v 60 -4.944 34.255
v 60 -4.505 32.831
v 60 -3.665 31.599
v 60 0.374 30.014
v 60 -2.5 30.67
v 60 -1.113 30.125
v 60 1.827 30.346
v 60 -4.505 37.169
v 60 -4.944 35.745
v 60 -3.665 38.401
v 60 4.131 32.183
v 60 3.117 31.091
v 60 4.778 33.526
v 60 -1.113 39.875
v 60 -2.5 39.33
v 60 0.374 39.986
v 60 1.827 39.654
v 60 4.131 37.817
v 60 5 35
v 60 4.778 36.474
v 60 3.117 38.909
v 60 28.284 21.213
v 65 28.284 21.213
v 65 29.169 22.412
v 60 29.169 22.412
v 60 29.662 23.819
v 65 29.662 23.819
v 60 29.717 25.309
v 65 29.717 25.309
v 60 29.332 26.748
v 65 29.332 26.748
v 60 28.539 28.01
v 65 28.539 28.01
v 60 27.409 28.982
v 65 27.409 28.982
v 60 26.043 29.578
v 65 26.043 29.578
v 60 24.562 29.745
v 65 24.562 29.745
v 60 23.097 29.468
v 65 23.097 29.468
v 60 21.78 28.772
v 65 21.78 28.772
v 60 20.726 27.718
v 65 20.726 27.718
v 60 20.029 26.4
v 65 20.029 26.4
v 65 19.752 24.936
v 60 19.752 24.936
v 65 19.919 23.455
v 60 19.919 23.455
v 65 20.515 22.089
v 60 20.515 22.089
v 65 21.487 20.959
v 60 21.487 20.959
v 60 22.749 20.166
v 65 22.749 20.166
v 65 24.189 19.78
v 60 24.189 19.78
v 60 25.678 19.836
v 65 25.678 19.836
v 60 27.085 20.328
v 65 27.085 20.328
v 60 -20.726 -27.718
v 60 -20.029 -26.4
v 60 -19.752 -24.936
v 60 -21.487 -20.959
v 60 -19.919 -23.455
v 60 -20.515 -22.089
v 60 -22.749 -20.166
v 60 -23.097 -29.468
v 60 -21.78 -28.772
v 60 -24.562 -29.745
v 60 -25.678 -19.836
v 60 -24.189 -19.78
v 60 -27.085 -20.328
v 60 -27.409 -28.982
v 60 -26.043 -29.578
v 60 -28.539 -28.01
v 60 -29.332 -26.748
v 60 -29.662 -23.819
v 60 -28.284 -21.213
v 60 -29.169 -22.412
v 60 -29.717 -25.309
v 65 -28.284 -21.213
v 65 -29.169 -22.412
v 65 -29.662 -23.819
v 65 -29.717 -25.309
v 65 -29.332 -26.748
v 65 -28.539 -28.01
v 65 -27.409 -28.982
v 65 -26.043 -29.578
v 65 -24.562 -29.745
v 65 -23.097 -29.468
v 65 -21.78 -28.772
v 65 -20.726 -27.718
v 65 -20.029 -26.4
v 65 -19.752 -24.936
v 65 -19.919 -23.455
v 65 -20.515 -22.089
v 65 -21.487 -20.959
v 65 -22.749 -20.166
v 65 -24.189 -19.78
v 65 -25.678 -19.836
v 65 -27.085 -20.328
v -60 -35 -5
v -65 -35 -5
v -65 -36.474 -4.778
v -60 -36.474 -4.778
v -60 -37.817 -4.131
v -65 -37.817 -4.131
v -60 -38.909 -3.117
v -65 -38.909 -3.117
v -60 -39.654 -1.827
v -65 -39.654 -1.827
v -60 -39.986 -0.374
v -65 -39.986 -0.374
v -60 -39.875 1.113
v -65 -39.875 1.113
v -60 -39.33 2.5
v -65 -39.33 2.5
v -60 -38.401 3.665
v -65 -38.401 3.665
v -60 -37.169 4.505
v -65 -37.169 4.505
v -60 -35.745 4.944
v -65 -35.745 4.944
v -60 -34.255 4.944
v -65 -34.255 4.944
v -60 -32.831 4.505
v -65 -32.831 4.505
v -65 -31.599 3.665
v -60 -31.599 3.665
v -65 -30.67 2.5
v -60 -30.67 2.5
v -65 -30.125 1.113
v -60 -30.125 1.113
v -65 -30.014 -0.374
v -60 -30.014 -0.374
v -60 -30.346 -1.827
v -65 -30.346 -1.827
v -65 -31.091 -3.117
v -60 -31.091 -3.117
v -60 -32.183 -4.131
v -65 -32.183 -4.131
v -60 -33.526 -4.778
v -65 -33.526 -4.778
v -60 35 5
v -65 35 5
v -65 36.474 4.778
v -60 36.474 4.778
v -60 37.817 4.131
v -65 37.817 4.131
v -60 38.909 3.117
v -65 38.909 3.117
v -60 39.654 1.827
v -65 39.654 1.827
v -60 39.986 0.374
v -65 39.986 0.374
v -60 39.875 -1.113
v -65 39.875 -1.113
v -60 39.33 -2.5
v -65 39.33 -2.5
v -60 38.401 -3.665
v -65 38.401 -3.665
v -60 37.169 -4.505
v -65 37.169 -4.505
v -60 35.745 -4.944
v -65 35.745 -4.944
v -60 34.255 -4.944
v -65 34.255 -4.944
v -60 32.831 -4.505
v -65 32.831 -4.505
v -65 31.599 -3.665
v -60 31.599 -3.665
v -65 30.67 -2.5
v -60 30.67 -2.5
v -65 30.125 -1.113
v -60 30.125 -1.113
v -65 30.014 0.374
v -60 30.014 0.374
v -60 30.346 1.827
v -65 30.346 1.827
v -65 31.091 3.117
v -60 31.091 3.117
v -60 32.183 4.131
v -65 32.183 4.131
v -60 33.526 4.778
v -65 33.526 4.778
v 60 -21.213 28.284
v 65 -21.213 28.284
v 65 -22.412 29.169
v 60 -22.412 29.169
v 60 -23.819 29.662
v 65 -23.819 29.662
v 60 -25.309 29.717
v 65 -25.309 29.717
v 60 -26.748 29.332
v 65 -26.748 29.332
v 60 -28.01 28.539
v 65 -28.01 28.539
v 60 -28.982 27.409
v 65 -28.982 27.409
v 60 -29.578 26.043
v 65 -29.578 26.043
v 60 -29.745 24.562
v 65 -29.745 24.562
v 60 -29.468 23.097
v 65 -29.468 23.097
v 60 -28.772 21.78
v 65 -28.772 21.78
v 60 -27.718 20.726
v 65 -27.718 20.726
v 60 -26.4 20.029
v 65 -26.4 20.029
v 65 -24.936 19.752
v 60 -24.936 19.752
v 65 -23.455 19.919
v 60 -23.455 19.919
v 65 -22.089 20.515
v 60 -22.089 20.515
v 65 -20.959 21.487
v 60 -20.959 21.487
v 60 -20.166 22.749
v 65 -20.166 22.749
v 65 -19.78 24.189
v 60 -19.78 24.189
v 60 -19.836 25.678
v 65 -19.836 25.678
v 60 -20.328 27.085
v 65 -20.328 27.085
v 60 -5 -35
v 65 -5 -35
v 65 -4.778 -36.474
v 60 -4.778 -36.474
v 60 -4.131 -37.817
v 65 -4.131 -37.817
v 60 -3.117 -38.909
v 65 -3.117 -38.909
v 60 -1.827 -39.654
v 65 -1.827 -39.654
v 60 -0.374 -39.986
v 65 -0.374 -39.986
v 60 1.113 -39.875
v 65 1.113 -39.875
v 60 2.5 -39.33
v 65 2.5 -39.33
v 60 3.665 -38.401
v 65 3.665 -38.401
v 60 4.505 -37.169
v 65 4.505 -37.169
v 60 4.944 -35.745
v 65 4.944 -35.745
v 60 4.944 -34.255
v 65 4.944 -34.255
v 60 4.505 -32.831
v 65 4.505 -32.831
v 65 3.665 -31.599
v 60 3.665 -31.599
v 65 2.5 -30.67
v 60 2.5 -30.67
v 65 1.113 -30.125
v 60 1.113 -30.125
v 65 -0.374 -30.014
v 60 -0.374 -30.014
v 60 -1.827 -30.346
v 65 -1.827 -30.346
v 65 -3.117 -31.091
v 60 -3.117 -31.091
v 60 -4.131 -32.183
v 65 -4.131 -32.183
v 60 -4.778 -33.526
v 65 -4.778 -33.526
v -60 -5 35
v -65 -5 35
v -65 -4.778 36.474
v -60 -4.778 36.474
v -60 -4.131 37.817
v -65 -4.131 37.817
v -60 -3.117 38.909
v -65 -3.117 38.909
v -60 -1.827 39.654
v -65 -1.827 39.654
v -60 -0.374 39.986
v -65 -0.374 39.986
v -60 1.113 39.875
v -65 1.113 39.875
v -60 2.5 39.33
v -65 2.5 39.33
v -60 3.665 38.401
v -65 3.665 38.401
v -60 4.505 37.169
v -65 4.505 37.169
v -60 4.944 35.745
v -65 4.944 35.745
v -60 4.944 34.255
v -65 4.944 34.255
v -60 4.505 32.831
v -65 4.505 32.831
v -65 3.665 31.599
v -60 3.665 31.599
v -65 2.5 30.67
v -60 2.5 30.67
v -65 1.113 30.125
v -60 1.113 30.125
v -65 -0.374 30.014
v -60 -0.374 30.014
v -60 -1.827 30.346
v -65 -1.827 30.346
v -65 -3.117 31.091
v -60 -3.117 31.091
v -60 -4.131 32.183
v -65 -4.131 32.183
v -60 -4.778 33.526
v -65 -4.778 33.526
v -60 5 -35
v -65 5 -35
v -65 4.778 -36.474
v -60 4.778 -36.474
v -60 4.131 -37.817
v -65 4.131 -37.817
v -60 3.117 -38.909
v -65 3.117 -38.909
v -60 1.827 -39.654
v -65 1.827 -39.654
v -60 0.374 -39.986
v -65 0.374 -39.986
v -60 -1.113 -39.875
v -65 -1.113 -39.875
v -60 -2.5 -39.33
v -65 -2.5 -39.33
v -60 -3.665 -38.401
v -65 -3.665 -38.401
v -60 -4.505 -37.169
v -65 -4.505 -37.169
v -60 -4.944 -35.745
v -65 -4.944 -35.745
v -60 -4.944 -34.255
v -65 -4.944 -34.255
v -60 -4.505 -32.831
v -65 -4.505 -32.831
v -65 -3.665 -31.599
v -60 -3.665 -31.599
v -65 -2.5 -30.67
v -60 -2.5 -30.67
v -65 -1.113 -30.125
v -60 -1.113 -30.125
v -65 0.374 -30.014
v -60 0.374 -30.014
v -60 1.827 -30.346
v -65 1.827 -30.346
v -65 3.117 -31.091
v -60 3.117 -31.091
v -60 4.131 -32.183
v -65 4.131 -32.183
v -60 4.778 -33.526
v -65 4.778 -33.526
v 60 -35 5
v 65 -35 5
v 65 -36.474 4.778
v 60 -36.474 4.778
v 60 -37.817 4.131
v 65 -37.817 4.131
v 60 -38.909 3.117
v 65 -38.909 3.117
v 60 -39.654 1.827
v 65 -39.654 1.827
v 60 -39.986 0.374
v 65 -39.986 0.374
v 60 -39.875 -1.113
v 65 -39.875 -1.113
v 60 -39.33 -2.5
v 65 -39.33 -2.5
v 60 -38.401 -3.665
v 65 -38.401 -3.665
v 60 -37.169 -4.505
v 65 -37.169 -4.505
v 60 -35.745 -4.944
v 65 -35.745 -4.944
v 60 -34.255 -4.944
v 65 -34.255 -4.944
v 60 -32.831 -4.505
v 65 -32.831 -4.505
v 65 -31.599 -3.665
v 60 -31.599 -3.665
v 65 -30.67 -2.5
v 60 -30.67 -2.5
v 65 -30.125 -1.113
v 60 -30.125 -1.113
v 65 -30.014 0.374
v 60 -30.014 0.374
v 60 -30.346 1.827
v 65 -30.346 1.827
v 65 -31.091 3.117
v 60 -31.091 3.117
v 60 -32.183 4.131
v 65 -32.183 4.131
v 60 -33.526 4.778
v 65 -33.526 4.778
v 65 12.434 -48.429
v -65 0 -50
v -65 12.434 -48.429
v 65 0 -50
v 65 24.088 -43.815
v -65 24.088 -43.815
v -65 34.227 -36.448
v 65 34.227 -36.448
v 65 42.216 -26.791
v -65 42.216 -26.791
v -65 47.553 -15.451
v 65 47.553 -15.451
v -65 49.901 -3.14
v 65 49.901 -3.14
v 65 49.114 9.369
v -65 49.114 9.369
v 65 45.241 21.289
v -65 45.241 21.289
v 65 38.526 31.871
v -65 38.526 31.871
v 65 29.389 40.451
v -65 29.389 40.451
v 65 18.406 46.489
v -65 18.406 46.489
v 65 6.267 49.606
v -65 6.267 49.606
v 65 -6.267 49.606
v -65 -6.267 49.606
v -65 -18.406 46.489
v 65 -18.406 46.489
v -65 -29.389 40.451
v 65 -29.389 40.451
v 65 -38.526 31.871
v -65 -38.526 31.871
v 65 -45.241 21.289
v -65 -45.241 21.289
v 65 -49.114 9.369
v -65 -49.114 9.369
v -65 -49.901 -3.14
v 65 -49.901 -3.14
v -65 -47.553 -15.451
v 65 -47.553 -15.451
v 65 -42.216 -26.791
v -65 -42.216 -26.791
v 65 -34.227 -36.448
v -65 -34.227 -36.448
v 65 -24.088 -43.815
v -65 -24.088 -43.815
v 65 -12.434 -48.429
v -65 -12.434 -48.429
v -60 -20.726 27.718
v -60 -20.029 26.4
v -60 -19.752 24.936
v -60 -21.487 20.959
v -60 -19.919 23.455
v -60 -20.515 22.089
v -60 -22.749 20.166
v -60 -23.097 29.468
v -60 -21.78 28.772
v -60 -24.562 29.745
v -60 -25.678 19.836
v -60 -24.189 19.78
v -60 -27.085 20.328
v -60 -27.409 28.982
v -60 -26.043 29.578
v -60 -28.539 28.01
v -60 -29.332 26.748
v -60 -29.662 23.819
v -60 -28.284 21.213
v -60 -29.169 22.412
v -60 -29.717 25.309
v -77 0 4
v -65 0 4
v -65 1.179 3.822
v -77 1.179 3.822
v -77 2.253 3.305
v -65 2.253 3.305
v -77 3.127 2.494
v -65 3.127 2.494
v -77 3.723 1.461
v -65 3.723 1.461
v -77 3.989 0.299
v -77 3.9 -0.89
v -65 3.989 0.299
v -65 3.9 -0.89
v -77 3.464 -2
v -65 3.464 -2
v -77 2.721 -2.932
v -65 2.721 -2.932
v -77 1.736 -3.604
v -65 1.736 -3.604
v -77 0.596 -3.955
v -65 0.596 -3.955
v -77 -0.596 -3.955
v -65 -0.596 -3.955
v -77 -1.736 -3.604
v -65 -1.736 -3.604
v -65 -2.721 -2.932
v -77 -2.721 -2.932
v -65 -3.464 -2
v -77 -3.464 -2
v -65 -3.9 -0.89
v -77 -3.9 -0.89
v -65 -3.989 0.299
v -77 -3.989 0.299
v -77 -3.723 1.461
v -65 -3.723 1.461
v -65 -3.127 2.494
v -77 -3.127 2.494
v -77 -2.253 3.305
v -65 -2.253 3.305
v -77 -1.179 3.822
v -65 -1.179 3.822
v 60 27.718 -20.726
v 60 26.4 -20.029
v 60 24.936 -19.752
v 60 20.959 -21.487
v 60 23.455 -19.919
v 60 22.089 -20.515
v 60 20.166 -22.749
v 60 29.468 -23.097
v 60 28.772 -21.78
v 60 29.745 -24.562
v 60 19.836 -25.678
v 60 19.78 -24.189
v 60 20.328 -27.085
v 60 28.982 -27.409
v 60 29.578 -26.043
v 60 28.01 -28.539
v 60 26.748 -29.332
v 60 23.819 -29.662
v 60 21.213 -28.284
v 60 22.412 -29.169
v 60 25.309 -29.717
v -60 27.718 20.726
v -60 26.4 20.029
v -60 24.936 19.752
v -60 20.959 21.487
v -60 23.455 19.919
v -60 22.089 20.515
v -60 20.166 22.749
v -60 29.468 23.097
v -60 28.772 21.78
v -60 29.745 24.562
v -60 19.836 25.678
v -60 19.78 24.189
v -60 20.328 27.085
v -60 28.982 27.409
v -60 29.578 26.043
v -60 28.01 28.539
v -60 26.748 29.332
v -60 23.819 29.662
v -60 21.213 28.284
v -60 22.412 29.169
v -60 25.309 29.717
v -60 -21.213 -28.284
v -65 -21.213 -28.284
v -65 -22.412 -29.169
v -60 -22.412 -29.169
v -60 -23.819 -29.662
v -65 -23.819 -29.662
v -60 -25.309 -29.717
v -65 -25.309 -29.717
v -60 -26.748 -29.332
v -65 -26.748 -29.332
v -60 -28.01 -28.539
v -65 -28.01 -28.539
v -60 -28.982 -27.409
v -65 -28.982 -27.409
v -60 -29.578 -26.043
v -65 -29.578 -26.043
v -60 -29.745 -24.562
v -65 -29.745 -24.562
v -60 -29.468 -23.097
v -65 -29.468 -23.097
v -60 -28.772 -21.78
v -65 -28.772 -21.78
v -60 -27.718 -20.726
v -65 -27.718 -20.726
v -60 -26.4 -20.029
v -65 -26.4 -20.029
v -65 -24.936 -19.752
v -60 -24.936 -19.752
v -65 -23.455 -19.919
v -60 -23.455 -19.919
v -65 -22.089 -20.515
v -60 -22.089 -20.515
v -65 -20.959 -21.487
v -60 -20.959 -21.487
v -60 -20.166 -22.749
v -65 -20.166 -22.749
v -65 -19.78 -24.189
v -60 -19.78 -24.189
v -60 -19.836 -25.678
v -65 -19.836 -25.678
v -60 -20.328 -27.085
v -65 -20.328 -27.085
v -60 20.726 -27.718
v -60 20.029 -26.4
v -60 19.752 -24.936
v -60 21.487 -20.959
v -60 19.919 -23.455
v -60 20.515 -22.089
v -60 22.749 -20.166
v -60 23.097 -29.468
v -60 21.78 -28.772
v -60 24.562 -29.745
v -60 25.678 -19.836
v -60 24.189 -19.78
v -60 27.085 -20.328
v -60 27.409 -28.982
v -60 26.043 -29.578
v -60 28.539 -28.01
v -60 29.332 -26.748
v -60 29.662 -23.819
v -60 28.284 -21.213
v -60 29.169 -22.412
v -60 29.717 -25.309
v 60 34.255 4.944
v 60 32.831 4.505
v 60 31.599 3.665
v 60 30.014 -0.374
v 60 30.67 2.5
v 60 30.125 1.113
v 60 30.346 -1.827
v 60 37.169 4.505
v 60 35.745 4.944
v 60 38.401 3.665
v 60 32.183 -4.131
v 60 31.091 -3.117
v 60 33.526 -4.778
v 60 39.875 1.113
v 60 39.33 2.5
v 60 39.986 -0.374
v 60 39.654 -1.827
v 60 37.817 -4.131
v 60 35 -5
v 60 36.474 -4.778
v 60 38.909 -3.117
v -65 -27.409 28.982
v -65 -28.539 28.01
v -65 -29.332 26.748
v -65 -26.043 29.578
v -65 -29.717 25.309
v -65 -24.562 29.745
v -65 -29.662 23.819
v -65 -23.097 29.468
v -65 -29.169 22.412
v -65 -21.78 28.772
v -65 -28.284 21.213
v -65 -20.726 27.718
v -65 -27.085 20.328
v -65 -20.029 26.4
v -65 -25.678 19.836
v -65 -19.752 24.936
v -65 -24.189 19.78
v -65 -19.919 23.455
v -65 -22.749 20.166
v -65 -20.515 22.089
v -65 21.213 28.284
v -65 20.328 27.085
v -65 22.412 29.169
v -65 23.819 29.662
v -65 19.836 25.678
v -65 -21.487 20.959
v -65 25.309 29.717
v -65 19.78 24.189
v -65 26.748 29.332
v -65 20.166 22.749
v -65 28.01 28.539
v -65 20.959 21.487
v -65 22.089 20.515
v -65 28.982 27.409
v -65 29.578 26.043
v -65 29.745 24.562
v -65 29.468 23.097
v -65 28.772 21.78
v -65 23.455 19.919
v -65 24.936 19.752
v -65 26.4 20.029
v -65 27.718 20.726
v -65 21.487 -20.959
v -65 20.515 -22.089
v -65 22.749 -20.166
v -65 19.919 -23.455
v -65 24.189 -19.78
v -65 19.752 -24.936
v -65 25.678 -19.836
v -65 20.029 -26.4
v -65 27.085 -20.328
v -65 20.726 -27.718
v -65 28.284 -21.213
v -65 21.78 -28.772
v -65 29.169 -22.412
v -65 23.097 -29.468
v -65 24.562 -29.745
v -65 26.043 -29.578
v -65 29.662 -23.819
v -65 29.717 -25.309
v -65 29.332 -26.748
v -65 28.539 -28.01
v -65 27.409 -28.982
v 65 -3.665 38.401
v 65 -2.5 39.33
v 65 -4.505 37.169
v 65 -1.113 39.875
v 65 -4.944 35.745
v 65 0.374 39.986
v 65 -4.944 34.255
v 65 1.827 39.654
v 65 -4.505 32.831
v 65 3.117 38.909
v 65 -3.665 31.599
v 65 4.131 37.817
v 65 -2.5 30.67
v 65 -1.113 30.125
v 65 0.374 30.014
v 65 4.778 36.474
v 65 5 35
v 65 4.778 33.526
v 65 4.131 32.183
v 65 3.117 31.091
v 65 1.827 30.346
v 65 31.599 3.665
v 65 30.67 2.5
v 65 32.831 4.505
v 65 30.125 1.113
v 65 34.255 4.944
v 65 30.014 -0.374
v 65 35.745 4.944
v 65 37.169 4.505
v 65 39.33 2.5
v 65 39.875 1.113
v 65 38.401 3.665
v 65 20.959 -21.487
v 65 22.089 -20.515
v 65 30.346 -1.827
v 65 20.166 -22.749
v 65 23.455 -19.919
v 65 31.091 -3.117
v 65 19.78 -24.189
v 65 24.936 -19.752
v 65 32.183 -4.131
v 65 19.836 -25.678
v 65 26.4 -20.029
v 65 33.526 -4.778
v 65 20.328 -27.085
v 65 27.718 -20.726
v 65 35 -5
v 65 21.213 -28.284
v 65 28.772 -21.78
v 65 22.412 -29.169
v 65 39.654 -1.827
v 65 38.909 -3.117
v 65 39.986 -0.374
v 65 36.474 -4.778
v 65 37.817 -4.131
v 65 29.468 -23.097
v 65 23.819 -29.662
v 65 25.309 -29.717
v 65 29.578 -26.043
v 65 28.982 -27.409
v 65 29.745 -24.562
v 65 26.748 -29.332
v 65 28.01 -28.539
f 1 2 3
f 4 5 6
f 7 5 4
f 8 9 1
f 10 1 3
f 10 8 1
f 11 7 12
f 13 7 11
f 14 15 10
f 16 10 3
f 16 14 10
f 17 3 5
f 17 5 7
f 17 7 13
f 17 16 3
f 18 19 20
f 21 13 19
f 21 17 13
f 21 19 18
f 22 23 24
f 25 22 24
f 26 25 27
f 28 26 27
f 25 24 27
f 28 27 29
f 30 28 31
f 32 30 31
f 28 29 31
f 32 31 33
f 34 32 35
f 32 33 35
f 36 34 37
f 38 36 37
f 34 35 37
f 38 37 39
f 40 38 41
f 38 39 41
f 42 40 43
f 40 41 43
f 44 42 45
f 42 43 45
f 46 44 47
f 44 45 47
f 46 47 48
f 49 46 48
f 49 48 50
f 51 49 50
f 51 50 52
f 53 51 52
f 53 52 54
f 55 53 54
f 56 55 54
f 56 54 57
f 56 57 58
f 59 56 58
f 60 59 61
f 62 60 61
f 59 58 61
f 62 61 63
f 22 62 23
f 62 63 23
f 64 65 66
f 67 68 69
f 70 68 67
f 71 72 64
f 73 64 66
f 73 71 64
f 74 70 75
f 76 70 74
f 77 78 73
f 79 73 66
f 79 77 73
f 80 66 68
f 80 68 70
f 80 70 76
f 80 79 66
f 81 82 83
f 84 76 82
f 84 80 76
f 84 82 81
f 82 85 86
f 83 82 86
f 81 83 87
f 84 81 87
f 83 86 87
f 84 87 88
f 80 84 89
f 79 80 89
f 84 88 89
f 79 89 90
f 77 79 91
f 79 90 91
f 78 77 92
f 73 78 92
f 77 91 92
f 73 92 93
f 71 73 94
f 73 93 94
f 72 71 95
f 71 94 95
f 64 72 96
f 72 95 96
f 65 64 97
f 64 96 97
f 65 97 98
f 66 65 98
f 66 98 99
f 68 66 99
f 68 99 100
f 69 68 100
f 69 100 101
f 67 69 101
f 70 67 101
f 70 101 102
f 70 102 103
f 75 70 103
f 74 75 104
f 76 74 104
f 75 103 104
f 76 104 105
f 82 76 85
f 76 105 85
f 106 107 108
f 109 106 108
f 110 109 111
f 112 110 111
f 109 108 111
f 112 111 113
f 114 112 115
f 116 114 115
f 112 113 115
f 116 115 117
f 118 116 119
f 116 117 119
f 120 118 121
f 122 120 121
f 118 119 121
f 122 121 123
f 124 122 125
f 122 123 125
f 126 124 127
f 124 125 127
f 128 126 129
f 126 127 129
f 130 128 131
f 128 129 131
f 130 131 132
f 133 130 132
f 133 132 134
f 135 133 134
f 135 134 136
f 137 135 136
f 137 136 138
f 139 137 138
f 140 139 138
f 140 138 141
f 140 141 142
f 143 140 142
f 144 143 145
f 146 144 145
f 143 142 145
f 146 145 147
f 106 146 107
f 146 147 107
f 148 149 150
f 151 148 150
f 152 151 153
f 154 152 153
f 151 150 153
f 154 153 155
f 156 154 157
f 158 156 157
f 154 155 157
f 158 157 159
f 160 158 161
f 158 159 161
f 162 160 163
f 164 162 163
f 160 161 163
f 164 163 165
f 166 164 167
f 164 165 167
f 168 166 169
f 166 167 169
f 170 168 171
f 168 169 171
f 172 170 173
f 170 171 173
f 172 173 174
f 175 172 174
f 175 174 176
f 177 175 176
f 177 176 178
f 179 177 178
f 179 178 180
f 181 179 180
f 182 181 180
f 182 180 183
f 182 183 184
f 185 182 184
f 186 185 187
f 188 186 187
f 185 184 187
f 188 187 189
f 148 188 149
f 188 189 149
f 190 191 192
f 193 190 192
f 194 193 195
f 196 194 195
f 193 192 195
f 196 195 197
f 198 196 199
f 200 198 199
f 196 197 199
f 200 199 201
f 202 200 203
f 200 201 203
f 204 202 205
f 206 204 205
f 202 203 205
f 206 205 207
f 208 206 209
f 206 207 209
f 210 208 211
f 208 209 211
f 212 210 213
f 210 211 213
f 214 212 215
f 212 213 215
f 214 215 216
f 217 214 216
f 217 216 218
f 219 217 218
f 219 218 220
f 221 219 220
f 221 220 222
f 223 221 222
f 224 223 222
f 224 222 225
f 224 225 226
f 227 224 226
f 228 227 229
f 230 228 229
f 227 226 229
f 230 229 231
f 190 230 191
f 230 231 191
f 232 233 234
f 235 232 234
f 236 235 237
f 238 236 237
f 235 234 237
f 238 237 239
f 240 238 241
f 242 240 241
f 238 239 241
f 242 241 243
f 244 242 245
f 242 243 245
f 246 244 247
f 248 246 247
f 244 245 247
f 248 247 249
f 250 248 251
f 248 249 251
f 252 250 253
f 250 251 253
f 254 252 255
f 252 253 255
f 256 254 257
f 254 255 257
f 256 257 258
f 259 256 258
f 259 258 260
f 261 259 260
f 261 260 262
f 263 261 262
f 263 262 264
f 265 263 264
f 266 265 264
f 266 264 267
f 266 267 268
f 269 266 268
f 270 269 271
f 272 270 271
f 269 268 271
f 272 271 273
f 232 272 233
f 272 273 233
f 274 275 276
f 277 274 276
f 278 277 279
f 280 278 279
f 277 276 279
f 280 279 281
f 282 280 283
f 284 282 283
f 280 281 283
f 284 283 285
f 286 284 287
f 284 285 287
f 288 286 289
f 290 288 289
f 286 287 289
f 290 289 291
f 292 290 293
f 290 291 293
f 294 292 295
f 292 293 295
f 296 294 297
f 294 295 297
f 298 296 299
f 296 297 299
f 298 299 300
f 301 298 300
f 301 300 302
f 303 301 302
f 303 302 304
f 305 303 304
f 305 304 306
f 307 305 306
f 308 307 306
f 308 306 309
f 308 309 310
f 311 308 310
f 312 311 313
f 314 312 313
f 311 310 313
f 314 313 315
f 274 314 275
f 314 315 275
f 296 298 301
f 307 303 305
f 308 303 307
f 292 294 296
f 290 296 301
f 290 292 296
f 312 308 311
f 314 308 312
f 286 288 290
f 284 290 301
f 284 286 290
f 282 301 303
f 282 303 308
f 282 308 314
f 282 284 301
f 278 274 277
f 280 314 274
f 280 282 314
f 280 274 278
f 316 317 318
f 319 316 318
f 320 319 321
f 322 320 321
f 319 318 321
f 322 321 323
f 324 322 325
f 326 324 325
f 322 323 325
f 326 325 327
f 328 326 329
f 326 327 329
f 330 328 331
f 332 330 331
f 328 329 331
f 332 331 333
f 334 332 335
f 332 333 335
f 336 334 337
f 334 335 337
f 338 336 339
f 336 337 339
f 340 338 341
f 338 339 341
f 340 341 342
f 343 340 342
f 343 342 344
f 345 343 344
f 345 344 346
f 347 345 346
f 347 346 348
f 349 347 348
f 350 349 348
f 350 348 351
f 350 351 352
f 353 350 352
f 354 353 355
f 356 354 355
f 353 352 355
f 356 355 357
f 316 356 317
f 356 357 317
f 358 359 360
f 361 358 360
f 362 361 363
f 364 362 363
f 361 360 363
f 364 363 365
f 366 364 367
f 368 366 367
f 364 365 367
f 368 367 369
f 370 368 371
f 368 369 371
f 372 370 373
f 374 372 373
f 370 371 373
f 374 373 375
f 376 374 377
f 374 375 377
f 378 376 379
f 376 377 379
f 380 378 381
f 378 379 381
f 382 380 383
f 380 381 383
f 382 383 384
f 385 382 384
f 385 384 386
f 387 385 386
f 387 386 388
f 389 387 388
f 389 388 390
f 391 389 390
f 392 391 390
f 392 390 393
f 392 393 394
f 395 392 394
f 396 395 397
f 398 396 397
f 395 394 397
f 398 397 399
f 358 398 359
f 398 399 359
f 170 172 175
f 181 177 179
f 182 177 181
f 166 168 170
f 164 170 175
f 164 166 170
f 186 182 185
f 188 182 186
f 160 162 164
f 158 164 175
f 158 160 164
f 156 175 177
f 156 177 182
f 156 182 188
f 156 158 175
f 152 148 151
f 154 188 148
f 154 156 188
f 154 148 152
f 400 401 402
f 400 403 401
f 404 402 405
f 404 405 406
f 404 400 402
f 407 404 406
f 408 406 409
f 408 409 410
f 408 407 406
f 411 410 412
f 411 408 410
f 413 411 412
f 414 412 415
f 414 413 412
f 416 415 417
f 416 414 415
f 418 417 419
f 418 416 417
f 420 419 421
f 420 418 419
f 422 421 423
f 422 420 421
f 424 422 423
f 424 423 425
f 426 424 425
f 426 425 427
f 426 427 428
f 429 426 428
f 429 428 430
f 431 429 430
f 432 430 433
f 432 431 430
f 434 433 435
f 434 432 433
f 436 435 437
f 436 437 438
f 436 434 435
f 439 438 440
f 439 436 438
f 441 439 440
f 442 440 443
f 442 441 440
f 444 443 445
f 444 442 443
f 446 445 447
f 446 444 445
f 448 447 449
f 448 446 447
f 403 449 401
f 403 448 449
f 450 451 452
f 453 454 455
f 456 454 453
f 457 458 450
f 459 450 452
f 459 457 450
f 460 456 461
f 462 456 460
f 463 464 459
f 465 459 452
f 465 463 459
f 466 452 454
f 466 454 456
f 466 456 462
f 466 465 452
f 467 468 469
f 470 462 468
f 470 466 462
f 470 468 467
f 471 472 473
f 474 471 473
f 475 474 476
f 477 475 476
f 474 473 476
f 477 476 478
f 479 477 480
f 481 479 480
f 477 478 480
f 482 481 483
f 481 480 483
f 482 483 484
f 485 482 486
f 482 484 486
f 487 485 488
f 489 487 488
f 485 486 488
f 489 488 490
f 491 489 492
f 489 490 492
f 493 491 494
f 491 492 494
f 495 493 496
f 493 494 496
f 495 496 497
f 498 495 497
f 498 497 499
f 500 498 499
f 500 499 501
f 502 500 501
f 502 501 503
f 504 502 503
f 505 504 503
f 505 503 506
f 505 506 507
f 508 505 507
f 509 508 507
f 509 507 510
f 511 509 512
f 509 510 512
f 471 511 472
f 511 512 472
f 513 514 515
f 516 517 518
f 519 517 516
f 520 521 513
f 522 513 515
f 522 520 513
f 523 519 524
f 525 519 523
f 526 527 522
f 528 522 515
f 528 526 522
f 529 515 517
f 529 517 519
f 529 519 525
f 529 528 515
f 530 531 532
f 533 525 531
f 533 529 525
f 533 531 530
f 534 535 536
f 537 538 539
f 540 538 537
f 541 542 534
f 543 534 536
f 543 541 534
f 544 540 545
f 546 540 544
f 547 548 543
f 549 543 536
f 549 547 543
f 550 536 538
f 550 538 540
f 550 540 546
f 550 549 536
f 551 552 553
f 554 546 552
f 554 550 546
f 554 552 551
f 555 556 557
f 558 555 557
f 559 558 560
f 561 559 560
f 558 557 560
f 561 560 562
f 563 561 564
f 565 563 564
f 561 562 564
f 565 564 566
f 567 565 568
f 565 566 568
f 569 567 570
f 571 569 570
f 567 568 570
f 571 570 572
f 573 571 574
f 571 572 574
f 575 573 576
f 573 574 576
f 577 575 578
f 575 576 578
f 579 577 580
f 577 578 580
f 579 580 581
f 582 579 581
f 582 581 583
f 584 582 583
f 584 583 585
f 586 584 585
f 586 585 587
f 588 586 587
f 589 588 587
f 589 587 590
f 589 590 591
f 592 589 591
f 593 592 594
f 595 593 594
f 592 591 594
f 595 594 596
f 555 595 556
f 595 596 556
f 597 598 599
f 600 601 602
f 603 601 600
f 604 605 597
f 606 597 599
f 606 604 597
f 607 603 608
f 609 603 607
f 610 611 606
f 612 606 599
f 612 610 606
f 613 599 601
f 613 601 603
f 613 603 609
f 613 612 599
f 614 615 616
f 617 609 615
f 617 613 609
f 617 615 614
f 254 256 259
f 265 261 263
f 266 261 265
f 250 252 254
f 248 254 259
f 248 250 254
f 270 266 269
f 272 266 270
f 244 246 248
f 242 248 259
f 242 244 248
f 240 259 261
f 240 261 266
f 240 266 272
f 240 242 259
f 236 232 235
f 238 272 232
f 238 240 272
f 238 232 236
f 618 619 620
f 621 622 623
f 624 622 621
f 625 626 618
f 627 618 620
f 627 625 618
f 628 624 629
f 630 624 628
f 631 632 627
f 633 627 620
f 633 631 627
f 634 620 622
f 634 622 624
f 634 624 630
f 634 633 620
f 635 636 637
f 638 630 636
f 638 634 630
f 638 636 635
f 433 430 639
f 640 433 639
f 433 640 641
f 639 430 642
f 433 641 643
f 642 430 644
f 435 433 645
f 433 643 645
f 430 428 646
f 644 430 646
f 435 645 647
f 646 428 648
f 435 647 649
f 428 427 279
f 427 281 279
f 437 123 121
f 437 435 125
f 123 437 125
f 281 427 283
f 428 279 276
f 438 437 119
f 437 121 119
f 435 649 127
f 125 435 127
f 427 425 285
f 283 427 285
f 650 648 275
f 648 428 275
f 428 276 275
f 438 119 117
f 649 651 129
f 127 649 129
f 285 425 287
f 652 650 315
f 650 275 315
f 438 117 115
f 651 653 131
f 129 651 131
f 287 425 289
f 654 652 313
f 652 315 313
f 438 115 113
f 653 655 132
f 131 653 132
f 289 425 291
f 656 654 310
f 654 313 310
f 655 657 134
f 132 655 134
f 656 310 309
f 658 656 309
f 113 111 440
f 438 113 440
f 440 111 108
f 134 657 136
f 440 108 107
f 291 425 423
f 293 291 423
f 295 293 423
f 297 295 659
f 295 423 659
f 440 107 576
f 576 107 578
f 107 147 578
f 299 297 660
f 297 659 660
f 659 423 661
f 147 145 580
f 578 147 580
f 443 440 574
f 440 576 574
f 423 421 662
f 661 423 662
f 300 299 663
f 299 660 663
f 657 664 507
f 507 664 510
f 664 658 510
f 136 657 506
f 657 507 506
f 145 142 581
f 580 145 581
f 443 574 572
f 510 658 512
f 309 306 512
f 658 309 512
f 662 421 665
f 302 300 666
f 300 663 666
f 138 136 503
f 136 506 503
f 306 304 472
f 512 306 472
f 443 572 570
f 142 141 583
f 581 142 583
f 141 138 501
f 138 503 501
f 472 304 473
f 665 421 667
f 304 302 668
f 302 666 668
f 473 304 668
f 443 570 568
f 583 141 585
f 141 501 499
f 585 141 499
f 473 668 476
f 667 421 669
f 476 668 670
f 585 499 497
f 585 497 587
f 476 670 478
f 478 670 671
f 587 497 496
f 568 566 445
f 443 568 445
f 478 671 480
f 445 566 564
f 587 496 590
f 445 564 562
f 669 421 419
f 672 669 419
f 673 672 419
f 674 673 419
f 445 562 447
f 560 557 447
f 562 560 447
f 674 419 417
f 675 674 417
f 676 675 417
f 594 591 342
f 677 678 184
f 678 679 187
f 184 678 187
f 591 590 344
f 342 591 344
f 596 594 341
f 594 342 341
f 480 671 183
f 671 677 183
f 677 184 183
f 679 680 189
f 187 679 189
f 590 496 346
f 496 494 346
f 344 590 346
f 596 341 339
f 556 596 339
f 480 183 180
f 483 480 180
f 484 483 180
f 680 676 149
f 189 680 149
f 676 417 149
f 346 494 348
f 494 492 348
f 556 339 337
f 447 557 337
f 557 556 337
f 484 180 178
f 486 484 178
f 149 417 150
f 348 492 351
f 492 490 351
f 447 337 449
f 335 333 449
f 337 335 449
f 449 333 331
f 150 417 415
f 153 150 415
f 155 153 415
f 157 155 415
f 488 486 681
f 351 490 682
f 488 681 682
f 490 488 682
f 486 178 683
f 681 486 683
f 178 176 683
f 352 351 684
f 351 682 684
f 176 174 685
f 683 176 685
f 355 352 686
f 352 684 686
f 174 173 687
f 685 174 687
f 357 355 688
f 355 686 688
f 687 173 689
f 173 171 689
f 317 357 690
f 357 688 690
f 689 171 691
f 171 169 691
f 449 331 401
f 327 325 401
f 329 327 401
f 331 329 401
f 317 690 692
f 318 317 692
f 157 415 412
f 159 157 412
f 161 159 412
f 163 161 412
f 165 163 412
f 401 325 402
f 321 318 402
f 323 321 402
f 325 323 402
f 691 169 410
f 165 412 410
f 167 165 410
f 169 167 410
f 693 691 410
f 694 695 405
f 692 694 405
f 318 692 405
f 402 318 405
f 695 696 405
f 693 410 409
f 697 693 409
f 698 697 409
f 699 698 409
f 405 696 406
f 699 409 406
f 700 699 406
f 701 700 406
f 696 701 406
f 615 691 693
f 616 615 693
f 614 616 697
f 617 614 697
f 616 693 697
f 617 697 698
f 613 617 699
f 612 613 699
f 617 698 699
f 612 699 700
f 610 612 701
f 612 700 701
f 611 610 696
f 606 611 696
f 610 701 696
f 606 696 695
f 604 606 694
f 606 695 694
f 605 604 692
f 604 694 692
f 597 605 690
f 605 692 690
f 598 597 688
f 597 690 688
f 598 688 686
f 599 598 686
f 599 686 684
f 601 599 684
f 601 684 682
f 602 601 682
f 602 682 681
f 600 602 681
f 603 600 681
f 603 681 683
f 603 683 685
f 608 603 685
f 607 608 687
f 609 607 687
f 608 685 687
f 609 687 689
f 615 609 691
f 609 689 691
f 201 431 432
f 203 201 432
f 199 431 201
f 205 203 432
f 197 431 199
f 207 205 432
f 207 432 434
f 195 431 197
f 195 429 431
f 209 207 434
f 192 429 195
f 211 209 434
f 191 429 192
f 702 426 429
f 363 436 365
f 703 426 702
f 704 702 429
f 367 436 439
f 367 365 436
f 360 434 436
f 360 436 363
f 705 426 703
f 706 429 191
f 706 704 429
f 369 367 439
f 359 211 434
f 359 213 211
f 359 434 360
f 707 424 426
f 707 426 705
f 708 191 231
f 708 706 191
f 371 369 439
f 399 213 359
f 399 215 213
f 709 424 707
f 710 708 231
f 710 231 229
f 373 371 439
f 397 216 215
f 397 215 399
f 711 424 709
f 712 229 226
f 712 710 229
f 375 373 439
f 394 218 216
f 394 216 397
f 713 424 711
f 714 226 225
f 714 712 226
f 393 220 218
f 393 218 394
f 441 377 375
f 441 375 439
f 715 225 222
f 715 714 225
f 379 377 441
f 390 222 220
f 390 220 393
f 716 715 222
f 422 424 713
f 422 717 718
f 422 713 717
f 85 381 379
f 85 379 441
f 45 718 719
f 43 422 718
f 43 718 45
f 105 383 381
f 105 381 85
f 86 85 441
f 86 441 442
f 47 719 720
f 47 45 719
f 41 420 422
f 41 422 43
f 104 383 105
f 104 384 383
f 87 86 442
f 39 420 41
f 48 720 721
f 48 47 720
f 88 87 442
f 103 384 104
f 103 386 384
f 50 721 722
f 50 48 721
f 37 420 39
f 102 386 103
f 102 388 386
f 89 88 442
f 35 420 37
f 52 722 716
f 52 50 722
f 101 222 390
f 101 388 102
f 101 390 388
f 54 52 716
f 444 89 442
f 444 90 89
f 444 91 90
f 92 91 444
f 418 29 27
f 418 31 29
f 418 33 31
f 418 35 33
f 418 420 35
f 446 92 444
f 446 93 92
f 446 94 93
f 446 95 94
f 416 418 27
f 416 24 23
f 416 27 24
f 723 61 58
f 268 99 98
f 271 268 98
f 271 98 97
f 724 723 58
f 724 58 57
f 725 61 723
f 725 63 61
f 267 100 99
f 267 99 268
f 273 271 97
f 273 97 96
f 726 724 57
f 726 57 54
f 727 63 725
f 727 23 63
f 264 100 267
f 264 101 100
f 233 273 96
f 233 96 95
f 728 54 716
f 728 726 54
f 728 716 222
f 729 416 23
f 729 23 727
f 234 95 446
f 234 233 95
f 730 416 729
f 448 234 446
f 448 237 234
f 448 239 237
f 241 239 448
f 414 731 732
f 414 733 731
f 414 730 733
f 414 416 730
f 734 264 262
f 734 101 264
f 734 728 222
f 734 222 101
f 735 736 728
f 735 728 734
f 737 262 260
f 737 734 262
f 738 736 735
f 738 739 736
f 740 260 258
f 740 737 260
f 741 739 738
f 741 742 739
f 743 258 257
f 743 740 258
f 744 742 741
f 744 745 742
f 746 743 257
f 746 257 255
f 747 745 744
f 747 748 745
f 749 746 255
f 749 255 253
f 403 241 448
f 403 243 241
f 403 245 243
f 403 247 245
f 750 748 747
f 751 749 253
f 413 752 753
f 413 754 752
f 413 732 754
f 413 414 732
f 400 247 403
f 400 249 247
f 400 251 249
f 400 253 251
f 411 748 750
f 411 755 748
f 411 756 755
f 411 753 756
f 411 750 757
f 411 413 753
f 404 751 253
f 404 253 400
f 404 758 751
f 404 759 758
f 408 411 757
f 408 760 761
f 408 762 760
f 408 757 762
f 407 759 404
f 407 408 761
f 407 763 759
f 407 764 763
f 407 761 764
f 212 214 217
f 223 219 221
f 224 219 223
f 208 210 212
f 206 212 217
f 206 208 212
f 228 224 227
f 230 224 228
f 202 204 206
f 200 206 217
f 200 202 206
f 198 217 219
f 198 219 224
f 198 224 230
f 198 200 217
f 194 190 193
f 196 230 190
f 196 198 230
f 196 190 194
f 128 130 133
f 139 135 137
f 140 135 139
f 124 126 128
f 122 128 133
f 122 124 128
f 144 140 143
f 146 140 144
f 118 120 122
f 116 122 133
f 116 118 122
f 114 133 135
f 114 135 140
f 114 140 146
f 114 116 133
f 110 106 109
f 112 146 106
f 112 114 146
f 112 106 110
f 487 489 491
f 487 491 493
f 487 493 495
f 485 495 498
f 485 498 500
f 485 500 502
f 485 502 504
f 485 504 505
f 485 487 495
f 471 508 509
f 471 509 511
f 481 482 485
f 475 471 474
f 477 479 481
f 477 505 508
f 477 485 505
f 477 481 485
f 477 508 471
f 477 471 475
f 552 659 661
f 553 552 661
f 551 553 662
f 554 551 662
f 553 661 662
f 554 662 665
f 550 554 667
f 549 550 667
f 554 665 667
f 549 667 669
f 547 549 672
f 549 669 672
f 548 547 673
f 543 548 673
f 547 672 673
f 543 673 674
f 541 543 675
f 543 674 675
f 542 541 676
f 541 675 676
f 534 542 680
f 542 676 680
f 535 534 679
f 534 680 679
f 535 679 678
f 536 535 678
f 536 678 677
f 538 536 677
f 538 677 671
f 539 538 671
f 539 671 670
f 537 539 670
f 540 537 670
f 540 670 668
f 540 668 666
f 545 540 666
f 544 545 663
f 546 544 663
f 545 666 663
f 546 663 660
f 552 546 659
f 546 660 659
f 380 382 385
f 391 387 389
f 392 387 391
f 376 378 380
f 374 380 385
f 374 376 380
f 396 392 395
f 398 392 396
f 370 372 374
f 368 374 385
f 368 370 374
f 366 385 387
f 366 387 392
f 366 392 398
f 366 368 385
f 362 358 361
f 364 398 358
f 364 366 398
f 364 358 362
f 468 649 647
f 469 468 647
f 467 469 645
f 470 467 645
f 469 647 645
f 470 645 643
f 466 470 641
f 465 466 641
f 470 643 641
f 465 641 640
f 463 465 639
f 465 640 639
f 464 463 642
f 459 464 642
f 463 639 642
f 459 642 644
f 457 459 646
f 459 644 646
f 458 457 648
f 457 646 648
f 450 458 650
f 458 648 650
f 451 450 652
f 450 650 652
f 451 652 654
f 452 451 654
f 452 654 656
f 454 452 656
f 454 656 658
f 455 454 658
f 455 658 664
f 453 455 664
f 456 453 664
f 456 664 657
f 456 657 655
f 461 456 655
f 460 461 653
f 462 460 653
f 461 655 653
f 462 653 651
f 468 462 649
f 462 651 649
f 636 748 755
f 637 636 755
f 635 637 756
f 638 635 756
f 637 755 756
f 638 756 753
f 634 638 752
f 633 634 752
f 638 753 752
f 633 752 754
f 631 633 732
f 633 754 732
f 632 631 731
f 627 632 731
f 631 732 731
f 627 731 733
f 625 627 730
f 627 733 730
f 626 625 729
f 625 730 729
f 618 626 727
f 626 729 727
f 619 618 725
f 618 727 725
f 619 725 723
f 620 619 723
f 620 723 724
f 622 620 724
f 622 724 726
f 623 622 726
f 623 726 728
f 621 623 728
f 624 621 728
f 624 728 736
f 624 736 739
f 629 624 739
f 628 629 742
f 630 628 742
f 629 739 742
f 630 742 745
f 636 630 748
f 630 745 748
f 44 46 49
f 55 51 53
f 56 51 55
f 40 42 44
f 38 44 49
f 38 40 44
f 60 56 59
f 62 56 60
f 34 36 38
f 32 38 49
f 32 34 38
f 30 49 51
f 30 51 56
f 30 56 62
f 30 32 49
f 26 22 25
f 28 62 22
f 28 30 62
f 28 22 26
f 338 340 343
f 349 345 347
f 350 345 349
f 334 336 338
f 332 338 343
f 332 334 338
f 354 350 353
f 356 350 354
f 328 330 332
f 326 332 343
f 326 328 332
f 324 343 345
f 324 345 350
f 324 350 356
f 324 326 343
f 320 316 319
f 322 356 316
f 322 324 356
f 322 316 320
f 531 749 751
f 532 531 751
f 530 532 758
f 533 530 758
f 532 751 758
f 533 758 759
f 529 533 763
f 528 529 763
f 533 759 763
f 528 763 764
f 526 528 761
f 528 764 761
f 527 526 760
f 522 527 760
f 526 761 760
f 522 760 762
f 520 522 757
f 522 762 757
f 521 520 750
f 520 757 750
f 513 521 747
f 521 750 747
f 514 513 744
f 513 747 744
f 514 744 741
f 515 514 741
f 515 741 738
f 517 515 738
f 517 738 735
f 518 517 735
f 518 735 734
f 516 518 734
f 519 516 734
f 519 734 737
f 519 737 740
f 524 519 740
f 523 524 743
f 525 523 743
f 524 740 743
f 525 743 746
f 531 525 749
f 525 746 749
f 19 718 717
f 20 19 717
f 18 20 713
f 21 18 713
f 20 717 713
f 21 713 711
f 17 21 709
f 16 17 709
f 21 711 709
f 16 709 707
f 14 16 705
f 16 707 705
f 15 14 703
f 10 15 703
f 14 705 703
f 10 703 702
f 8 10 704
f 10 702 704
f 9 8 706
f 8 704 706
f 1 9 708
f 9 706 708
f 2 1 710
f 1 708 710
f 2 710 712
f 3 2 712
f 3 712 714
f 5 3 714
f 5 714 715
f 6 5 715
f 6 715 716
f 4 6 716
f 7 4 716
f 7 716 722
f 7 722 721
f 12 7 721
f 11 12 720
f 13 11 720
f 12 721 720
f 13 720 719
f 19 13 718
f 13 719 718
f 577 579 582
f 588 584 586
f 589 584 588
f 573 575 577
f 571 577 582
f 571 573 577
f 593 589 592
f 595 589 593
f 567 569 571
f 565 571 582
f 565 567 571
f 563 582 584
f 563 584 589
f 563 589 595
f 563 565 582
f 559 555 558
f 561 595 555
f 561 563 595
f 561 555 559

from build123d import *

# Parameters (mm, degrees)
SKETCH1_R           = 50
BOSS_EXTRUDE1_DEPTH = 65
SKETCH2_R           = 4
BOSS_EXTRUDE2_DEPTH = 12
SKETCH3_R           = 5
CUT_EXTRUDE1_DEPTH  = 5
CIRPATTERN1_COUNT   = 8
SKETCH4_R           = 5
CUT_EXTRUDE2_DEPTH  = 5
CIRPATTERN2_COUNT   = 8


with BuildPart() as part:
    # Sketch1 → Boss-Extrude1 (new body, symmetric)
    with BuildSketch(Plane(origin=(0, 0, 0), x_dir=(0, 0, -1), z_dir=(1, 0, 0))):
        Circle(SKETCH1_R)
    extrude(amount=BOSS_EXTRUDE1_DEPTH, both=True)

    # Sketch2 → Boss-Extrude2 (add)
    with BuildSketch(Plane.ZY.offset(65)):
        Circle(SKETCH2_R)
    extrude(amount=BOSS_EXTRUDE2_DEPTH)

    # Sketch3 → Cut-Extrude1 (cut)
    with BuildSketch(Plane.ZY.offset(65)):
        with Locations((0, 35)):
            Circle(SKETCH3_R)
    cut_extrude1 = extrude(amount=-CUT_EXTRUDE1_DEPTH, mode=Mode.SUBTRACT)

    # CirPattern1: Cut-Extrude1 ×8 about axis
    cirpattern1_axis = Axis((0, 0, 0), (1, 0, 0))
    for i in range(1, CIRPATTERN1_COUNT):
        add(cut_extrude1.rotate(cirpattern1_axis, i * 360 / CIRPATTERN1_COUNT), mode=Mode.SUBTRACT)

    # Sketch4 → Cut-Extrude2 (cut)
    with BuildSketch(Plane(origin=(65, 0, 0), x_dir=(0, 0, -1), z_dir=(1, 0, 0))):
        with Locations((0, 35)):
            Circle(SKETCH4_R)
    cut_extrude2 = extrude(amount=-CUT_EXTRUDE2_DEPTH, mode=Mode.SUBTRACT)

    # CirPattern2: Cut-Extrude2 ×8 about axis
    cirpattern2_axis = Axis((0, 0, 0), (1, 0, 0))
    for i in range(1, CIRPATTERN2_COUNT):
        add(cut_extrude2.rotate(cirpattern2_axis, i * 360 / CIRPATTERN2_COUNT), mode=Mode.SUBTRACT)


solid = part.part
